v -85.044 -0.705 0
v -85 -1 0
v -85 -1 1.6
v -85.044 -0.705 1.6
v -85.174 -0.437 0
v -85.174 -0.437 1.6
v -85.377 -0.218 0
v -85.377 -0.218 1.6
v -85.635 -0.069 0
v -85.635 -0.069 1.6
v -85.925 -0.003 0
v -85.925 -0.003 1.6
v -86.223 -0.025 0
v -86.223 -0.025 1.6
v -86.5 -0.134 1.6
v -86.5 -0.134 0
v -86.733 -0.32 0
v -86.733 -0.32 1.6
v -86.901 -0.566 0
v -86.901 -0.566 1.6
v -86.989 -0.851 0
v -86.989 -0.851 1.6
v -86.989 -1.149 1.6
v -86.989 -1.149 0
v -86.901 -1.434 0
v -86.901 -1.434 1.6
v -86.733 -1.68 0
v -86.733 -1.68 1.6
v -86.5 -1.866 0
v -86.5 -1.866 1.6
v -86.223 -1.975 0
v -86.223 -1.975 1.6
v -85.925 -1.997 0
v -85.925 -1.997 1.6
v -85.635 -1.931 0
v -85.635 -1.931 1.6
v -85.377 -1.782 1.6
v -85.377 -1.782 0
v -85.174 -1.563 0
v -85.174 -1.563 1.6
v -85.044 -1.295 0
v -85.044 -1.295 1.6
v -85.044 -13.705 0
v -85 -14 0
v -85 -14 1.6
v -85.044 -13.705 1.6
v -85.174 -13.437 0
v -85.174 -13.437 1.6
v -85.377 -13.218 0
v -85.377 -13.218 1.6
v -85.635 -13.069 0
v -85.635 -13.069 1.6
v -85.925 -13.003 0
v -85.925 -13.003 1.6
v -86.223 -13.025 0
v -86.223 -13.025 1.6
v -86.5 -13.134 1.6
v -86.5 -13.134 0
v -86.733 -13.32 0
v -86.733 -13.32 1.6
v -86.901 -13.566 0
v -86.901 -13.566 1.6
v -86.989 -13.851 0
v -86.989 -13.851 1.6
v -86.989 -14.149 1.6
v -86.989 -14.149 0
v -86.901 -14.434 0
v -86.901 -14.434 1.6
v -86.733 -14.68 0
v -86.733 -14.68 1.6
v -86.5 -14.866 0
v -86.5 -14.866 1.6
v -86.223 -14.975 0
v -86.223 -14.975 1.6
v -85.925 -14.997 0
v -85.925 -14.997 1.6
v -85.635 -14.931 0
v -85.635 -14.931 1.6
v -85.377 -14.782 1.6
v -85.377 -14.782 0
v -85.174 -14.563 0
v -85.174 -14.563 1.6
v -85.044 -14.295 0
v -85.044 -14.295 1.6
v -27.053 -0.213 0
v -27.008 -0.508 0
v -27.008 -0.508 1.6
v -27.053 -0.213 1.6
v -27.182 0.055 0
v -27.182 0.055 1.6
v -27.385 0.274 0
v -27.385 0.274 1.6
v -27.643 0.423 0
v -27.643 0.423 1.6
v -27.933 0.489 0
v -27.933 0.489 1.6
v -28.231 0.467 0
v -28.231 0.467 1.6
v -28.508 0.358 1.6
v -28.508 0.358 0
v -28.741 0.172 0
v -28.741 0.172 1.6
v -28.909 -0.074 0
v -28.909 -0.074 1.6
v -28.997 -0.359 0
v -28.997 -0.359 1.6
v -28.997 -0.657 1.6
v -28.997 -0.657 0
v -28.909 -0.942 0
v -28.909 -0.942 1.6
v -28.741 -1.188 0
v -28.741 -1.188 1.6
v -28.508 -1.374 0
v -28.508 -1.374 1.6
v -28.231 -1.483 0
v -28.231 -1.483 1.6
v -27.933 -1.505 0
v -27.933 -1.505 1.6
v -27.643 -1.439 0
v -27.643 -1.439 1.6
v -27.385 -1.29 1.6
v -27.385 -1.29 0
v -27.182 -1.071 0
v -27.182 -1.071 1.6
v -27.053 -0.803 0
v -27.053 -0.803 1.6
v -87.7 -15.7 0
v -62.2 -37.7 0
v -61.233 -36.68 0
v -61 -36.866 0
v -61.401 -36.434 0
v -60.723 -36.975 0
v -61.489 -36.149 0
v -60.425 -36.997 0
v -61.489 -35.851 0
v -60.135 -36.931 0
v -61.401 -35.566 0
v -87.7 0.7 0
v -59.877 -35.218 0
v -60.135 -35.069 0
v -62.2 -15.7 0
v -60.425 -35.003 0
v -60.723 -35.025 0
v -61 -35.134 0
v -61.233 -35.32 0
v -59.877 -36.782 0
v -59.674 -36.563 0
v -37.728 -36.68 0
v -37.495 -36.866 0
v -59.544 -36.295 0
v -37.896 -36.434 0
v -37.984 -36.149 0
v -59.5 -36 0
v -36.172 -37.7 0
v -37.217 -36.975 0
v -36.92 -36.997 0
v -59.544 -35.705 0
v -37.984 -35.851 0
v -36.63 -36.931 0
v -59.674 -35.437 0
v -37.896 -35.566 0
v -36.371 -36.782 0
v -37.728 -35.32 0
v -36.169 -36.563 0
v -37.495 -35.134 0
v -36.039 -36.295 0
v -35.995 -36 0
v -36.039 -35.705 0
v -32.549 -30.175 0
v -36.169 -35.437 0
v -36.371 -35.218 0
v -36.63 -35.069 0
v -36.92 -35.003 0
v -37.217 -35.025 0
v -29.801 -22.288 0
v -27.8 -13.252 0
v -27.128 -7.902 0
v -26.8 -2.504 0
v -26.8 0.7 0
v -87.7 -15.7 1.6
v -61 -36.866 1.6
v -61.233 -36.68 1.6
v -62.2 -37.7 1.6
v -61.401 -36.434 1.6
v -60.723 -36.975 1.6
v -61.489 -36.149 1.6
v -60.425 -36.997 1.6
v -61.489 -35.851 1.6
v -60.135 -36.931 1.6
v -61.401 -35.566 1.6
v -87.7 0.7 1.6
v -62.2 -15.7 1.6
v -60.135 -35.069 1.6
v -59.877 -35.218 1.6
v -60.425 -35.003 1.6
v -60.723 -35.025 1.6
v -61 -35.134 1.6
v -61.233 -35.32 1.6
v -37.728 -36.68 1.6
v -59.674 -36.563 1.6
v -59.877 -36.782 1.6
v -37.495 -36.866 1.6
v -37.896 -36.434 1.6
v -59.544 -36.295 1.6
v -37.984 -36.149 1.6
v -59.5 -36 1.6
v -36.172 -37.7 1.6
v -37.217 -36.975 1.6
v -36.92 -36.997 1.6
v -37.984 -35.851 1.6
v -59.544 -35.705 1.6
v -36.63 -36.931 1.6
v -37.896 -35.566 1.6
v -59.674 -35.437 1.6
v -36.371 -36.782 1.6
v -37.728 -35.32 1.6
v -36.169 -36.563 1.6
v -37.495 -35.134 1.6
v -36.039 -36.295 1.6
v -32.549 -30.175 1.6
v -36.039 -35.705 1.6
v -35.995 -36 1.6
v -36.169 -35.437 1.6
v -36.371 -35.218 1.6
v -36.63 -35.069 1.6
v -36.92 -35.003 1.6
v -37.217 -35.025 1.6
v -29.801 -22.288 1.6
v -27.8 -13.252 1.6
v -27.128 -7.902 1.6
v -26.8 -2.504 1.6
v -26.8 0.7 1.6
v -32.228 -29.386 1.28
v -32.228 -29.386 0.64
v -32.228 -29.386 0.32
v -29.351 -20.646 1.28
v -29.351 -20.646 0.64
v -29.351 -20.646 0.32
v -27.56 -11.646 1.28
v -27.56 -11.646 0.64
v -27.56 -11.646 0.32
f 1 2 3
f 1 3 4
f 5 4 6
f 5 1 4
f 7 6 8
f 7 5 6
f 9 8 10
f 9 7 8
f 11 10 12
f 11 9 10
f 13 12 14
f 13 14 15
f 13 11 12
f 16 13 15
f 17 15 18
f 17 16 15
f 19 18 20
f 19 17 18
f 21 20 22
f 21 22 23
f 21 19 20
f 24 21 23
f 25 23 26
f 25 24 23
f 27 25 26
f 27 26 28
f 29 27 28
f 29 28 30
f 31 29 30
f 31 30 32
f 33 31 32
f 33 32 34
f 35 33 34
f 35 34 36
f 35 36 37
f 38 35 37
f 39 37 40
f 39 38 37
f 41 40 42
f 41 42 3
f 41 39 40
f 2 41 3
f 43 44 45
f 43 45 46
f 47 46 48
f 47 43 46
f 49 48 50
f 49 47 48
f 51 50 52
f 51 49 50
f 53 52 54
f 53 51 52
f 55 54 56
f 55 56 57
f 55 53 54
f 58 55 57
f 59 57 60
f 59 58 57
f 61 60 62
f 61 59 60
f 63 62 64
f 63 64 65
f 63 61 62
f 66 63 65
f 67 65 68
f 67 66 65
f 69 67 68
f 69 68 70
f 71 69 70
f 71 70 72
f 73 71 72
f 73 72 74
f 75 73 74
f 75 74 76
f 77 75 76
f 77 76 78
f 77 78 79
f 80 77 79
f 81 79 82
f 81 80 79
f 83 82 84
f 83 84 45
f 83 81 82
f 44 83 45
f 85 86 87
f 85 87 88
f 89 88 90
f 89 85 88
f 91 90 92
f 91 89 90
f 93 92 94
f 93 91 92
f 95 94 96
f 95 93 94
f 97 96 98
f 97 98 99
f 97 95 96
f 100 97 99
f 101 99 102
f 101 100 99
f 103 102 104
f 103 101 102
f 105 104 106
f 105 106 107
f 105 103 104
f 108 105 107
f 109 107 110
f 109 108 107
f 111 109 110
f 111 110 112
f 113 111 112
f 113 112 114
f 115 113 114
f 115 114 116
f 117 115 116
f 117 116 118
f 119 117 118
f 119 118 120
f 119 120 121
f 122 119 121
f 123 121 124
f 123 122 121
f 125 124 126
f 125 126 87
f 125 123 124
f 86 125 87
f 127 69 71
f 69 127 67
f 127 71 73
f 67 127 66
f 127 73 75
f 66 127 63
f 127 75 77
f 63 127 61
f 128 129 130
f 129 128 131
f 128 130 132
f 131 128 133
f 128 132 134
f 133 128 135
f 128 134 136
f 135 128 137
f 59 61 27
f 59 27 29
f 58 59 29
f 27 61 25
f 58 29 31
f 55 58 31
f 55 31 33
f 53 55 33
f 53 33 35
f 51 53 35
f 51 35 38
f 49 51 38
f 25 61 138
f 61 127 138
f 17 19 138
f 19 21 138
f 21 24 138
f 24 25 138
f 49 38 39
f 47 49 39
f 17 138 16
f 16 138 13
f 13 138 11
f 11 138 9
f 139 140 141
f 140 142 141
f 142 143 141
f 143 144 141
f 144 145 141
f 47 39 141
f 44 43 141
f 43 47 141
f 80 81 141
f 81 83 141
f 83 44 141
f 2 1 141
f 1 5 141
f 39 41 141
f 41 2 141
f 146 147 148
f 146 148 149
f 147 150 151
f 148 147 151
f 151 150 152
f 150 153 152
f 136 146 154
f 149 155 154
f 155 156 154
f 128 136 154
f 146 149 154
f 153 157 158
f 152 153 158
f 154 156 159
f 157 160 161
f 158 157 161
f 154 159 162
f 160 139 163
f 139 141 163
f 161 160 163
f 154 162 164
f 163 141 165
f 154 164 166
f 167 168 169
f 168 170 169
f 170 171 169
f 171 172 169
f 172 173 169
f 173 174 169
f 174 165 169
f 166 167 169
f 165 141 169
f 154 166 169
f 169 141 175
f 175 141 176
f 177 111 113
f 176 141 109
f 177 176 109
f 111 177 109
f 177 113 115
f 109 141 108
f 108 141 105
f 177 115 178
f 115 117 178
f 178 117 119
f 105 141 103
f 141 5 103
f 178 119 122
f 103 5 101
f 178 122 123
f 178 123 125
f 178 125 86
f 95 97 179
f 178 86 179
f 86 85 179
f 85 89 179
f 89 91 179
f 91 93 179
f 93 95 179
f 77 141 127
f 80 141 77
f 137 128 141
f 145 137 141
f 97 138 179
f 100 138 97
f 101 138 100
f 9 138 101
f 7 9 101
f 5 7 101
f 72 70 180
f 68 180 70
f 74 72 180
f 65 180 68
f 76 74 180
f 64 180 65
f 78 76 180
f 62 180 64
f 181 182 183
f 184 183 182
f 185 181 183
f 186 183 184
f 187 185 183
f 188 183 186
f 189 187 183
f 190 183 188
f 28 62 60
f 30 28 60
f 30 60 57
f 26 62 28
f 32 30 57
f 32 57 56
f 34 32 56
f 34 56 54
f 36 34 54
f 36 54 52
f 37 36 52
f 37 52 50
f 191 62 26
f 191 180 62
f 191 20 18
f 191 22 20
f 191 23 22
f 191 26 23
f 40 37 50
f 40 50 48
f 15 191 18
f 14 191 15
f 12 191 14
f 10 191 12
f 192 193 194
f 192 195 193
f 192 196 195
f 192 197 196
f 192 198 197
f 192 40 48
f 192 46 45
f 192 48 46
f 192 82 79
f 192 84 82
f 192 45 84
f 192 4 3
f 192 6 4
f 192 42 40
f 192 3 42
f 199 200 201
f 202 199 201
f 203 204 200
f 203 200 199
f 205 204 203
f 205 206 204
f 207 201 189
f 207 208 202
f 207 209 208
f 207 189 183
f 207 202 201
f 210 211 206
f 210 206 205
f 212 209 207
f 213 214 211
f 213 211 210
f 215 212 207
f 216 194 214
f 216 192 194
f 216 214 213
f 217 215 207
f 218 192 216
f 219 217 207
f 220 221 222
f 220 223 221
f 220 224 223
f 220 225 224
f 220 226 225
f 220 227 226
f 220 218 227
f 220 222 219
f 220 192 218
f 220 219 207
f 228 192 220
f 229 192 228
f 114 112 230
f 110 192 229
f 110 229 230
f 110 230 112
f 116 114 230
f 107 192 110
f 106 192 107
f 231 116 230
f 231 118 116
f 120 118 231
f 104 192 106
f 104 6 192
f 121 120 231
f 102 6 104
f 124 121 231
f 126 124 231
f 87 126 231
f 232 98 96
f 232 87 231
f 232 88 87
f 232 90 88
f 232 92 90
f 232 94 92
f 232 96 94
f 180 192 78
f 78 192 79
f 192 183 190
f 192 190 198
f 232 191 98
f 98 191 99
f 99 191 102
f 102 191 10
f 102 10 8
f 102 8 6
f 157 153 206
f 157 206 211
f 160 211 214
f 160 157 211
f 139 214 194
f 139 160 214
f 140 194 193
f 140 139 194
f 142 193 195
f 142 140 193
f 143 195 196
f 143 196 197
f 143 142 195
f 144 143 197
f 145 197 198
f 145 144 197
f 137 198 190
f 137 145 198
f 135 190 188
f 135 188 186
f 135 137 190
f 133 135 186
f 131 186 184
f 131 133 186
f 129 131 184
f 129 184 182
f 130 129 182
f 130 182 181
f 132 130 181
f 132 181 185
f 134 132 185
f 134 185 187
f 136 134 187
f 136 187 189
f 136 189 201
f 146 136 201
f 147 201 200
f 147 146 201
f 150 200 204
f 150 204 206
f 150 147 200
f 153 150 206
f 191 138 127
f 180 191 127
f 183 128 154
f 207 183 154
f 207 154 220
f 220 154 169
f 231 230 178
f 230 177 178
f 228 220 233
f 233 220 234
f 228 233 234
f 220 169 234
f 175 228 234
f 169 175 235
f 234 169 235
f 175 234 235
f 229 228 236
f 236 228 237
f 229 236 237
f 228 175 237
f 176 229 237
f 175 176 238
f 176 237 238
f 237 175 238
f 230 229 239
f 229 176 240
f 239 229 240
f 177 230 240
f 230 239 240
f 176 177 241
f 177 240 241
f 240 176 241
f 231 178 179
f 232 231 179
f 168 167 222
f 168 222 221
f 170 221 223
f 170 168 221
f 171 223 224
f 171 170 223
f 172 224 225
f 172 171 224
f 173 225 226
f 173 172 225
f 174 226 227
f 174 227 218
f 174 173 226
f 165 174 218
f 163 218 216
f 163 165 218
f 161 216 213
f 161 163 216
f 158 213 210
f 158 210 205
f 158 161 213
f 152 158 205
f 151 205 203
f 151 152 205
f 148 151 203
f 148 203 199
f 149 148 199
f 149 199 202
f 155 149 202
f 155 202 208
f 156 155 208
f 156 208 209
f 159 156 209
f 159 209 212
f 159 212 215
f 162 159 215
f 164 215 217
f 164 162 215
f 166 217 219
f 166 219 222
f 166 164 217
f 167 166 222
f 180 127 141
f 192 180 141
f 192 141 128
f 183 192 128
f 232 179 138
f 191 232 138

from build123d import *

# Parameters (mm, degrees)
SKETCH_1_R      = 1
EXTRUDE_1_DEPTH = 1.6


with BuildPart() as part:
    # 草图1 → 凸台-拉伸1 (new body)
    with BuildSketch(Plane.XY):
        with BuildLine():
            Line((-87.7, -15.7), (-62.2, -15.7))
            Line((-62.2, -15.7), (-62.2, -37.7))
            Line((-62.2, -37.7), (-36.171688324, -37.7))
            add(Edge.make_bspline(
                [(-36.171688324, -37.7), (-34.684824725, -35.010251168), (-33.36902465, -32.239648029), (-31.086941159, -26.53324039), (-30.129135695, -23.618286004), (-28.96165245, -19.160150204), (-28.618715853, -17.664940446), (-28.023260614, -14.664637138), (-27.770339575, -13.158305121), (-27.140235066, -8.621562635), (-26.891543642, -5.573428708), (-26.8, -2.503618714)],
                knots=[0, 0, 0, 0, 0.25, 0.25, 0.5, 0.5, 0.625, 0.625, 0.75, 0.75, 1, 1, 1, 1], degree=3))
            Line((-26.8, -2.503618714), (-26.8, 0.7))
            Line((-26.8, 0.7), (-87.7, 0.7))
            Line((-87.7, 0.7), (-87.7, -15.7))
        make_face()
        with Locations((-86, -1)):
            Circle(SKETCH_1_R, mode=Mode.SUBTRACT)
        with Locations((-86, -14)):
            Circle(SKETCH_1_R, mode=Mode.SUBTRACT)
        with Locations((-28.008087081, -0.508087081)):
            Circle(SKETCH_1_R, mode=Mode.SUBTRACT)
        with Locations((-36.994977349, -36)):
            Circle(SKETCH_1_R, mode=Mode.SUBTRACT)
        with Locations((-60.5, -36)):
            Circle(SKETCH_1_R, mode=Mode.SUBTRACT)
    extrude(amount=EXTRUDE_1_DEPTH)


solid = part.part
